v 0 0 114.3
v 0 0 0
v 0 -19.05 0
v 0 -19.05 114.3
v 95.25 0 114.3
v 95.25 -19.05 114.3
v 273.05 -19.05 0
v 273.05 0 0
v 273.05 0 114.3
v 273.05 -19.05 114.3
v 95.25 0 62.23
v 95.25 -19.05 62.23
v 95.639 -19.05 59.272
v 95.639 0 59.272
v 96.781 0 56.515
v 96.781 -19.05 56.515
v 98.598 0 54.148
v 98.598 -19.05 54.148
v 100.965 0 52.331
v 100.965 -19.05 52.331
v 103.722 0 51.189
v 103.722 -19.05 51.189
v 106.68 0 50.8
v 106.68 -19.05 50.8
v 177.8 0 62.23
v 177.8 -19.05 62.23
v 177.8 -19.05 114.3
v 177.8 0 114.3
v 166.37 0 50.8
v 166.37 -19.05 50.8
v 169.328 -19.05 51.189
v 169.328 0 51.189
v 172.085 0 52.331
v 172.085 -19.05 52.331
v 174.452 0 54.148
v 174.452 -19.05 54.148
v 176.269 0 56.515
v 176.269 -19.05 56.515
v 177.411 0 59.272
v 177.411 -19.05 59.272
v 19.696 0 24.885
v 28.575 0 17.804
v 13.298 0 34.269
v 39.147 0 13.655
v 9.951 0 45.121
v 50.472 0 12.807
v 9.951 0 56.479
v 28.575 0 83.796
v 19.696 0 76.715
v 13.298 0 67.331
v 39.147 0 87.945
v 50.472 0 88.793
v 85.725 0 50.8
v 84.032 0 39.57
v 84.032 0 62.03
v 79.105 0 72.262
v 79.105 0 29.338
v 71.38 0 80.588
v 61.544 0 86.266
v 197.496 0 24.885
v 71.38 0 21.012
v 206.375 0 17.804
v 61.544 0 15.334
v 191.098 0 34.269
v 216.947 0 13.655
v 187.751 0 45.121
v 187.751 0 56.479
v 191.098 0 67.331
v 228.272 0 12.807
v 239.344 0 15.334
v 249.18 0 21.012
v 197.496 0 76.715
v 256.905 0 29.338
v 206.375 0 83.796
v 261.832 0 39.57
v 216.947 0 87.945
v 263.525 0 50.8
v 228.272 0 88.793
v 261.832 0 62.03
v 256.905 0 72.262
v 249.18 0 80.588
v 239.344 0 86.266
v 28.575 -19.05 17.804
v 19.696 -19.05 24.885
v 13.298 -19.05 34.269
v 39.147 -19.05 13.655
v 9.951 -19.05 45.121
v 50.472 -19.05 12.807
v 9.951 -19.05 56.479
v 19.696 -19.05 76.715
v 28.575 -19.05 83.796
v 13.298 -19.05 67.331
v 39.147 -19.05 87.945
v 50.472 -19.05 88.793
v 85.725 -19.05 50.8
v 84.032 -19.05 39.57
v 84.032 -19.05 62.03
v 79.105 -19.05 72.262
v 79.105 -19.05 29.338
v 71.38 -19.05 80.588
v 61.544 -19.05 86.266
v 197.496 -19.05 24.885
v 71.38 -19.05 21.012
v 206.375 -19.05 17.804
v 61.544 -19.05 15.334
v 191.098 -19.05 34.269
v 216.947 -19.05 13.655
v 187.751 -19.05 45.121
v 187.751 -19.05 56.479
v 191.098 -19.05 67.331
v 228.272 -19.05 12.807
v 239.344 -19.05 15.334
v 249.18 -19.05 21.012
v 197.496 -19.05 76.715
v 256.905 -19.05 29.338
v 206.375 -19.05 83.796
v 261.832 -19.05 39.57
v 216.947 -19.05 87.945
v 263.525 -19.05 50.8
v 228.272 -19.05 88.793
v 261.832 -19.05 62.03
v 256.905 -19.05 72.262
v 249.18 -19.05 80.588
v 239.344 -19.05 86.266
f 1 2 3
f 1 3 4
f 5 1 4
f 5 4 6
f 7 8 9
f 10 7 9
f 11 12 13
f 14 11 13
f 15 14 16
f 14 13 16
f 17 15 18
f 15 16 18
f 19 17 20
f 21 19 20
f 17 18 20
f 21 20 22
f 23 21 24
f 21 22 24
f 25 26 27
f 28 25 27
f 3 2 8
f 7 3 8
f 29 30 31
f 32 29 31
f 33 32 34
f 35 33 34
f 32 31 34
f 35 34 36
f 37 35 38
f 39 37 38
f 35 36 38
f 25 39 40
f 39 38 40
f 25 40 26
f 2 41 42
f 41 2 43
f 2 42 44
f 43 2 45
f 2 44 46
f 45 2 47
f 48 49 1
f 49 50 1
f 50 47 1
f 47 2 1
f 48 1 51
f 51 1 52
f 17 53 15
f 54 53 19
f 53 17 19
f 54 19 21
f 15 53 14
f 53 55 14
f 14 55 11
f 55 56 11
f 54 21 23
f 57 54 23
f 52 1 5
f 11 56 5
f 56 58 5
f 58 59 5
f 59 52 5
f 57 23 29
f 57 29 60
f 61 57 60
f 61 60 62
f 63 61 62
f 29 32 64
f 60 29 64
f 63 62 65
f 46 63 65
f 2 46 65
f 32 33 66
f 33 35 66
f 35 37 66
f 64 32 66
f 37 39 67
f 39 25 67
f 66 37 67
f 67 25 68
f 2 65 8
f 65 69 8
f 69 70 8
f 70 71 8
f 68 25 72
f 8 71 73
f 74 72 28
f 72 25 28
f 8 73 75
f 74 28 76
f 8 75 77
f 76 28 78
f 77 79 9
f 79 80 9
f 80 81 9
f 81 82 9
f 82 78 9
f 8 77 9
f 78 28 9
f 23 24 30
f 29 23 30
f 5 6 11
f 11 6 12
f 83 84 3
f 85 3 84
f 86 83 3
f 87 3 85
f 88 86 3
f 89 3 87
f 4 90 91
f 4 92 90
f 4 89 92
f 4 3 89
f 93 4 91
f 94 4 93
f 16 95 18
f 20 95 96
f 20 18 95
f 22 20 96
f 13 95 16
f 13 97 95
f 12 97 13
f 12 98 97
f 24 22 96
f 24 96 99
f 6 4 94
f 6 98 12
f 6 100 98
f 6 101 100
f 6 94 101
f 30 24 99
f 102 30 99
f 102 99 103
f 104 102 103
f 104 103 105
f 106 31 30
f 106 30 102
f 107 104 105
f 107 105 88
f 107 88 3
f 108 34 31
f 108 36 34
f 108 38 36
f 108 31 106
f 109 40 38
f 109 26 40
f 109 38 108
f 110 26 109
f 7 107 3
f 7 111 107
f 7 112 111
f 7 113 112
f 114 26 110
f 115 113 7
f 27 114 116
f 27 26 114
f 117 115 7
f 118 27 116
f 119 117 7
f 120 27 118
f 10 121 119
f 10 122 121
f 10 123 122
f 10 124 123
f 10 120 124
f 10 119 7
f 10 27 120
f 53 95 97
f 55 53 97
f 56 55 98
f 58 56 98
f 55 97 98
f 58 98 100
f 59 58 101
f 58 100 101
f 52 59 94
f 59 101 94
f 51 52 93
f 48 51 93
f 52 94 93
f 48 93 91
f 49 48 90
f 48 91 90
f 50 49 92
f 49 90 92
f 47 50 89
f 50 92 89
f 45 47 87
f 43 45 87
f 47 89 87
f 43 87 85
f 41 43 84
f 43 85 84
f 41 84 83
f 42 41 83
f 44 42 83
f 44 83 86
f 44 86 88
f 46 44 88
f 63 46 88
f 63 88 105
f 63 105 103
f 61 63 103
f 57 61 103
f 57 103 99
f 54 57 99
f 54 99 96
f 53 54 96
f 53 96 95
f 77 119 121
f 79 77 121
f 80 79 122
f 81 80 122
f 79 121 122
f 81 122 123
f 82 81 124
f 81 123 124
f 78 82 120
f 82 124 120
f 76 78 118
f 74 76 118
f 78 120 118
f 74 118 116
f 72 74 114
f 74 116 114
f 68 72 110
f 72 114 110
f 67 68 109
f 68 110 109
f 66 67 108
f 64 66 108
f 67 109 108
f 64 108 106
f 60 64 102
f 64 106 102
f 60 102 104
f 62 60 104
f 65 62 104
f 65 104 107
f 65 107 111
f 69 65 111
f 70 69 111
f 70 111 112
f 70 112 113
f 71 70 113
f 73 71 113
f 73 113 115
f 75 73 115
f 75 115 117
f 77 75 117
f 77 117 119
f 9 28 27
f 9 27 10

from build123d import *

# Parameters (mm, degrees)
F0_W     = 273.05
F0_H     = 114.3
F1_DEPTH = 19.05
F2_R     = 38.1
F3_DEPTH = 25.4
F5_DEPTH = 25.4


with BuildPart() as f1:
    # F0 (on Front) → F1 (new body)
    with BuildSketch(Plane.XZ):
        with Locations((136.525, 57.15)):
            Rectangle(F0_W, F0_H)
    extrude(amount=F1_DEPTH)

    # F2 (on face) → F3 (cut)
    with BuildSketch(Plane.XZ.offset(19.05)):
        with Locations((225.425, 50.8)):
            Circle(F2_R)
        with Locations((47.625, 50.8)):
            Circle(F2_R)
    extrude(amount=-F3_DEPTH, mode=Mode.SUBTRACT)

    # F4 (on face) → F5 (cut)
    with BuildSketch(Plane.XZ.offset(19.05)):
        with BuildLine():
            Line((177.8, 114.3), (95.25, 114.3))
            Line((95.25, 114.3), (95.25, 62.23))
            ThreePointArc((95.25, 62.23), (98.597769, 54.147769), (106.68, 50.8))
            Line((106.68, 50.8), (166.37, 50.8))
            ThreePointArc((166.37, 50.8), (174.452231, 54.147769), (177.8, 62.23))
            Line((177.8, 62.23), (177.8, 114.3))
        make_face()
    extrude(amount=-F5_DEPTH, mode=Mode.SUBTRACT)


solid = f1.part
